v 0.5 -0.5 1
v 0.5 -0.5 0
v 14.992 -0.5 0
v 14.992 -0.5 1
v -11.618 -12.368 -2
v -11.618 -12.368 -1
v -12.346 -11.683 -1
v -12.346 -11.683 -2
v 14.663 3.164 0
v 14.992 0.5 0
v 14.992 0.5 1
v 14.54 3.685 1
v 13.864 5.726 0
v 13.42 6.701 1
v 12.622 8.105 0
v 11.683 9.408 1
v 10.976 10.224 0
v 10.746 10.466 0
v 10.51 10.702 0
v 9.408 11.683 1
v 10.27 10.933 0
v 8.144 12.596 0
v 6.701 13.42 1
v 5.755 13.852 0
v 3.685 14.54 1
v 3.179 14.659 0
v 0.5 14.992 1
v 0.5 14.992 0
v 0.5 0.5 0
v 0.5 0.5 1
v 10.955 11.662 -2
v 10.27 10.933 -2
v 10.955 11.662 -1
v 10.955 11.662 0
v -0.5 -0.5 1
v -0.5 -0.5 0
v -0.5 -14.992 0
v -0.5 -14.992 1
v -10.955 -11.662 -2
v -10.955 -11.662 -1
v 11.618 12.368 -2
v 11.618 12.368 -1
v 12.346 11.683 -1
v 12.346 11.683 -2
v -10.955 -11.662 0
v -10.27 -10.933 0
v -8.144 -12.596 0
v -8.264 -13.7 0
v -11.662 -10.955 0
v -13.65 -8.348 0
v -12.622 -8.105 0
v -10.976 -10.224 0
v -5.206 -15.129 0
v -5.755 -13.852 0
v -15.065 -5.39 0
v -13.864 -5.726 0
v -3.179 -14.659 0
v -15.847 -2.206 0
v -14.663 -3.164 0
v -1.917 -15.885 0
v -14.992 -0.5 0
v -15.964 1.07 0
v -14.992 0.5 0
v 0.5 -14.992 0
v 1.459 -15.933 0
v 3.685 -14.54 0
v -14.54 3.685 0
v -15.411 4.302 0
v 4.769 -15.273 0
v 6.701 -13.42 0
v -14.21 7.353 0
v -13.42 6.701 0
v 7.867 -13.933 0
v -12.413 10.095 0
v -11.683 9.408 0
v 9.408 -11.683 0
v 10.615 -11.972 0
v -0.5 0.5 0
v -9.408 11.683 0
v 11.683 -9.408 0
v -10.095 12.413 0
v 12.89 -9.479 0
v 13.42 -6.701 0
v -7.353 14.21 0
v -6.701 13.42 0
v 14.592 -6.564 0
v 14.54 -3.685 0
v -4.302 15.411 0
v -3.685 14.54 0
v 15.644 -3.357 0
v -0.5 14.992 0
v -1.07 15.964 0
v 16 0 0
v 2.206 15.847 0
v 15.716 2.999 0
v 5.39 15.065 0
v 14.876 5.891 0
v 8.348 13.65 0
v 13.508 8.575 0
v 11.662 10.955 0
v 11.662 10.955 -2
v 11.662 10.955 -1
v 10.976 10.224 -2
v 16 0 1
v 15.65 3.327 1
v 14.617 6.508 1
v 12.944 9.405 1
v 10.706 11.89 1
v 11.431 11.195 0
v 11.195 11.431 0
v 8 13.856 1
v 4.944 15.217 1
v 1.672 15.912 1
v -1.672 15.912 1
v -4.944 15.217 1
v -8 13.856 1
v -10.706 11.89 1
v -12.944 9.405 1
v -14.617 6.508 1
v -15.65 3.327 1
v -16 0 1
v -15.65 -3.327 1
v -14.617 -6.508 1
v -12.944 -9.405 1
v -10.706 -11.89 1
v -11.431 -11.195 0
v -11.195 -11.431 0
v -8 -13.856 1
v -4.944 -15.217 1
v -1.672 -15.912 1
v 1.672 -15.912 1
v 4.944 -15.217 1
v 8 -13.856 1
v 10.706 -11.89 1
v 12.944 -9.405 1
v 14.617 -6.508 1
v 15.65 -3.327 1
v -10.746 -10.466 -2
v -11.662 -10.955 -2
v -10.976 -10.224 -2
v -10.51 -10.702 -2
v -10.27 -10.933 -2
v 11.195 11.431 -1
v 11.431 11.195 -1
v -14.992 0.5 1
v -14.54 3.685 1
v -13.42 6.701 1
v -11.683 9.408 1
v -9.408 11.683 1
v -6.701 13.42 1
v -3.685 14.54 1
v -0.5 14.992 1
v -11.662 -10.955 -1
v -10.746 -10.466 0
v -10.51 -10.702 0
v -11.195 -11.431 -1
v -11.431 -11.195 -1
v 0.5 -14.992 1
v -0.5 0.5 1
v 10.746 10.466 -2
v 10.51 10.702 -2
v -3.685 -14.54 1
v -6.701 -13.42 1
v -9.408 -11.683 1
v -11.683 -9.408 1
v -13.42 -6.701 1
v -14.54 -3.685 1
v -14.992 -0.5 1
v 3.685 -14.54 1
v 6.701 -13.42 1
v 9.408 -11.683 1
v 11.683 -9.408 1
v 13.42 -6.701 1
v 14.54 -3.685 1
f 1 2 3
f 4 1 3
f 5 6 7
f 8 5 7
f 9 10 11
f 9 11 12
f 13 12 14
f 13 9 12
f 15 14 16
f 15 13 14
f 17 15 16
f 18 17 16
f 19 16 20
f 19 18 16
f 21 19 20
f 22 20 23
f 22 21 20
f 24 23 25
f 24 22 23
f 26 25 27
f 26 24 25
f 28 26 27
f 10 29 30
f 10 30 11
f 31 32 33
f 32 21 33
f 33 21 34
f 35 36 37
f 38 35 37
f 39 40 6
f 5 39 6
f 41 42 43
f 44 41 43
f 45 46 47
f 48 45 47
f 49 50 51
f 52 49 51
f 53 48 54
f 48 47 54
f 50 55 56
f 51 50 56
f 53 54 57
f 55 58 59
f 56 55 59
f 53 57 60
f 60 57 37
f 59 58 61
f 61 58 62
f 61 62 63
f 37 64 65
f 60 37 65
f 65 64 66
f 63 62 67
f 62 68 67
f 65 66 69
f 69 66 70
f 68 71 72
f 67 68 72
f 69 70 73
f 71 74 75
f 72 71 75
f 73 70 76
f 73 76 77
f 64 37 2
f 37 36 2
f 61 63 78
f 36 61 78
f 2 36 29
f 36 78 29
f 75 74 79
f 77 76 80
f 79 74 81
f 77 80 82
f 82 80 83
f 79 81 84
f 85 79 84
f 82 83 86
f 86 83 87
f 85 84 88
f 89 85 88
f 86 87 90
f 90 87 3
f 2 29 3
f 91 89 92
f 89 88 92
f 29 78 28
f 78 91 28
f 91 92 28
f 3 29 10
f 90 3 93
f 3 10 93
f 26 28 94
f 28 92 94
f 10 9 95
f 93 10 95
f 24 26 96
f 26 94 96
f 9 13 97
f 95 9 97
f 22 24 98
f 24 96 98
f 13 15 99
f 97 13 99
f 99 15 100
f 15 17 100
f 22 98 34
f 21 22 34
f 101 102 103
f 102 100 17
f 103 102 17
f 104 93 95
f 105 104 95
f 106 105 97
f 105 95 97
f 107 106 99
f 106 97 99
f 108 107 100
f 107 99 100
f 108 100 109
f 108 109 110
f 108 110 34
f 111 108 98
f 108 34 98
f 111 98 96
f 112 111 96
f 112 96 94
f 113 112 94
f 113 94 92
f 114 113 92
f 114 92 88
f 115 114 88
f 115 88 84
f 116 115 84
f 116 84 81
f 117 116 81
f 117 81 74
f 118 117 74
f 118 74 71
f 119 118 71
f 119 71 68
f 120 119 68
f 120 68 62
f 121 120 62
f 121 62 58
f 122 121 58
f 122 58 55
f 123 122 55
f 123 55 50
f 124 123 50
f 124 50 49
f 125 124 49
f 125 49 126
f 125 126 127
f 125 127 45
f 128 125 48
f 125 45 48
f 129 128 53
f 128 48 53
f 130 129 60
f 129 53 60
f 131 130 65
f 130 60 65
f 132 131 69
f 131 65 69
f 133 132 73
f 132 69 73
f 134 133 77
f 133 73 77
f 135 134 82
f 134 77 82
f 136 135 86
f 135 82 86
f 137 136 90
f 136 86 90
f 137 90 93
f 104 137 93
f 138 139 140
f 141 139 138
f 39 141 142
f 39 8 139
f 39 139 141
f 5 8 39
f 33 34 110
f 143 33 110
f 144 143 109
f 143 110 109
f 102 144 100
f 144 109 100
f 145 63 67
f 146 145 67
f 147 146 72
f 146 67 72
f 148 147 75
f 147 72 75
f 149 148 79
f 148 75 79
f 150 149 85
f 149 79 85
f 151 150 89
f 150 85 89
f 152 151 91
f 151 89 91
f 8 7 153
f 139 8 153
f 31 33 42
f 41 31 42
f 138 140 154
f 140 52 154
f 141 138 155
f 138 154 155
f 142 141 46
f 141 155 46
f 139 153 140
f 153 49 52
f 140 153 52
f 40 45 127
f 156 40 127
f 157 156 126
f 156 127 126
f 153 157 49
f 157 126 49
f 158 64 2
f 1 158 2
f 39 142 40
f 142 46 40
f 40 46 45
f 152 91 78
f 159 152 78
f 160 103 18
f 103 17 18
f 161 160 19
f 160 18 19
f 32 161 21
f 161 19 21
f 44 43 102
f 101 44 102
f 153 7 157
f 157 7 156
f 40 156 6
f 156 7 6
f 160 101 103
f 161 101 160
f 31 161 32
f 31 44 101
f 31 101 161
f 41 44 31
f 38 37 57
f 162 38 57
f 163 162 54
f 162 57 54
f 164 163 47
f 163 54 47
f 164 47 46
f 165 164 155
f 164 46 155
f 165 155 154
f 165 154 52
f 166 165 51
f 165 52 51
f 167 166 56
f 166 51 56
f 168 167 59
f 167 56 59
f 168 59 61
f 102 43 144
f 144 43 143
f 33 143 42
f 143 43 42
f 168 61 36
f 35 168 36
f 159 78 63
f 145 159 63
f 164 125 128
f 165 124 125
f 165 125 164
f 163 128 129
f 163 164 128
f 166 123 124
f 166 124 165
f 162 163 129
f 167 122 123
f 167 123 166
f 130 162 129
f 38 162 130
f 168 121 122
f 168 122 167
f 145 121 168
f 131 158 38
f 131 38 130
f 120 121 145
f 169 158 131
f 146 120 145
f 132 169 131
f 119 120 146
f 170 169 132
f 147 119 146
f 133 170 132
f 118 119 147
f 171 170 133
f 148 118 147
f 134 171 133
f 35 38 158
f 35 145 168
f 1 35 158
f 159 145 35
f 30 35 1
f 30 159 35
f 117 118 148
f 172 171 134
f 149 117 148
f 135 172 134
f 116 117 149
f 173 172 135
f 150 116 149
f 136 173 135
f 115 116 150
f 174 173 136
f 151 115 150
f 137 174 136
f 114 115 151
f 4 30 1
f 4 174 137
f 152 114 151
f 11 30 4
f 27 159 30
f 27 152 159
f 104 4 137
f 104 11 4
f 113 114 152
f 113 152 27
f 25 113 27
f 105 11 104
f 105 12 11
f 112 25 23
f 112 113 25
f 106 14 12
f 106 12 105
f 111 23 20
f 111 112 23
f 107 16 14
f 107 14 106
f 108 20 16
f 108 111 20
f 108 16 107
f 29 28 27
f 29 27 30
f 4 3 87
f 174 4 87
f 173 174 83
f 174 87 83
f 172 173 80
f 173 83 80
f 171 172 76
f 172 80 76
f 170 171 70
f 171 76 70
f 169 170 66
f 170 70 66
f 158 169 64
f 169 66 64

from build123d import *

# Parameters (mm, degrees)
SKETCH1_R           = 16
BOSS_EXTRUDE1_DEPTH = 1
BOSS_EXTRUDE2_DEPTH = 1
BOSS_EXTRUDE3_DEPTH = 1
CIRPATTERN1_COUNT   = 2


with BuildPart() as part:
    # Sketch1 → Boss-Extrude1 (new body)
    with BuildSketch(Plane.XY):
        Circle(SKETCH1_R)
        with BuildLine():
            Line((-0.5, 14.991664351), (-0.5, 0.5))
            Line((-0.5, 0.5), (-14.991664351, 0.5))
            ThreePointArc((-14.991664351, 0.5), (-10.606601718, 10.606601718), (-0.5, 14.991664351))
        make_face(mode=Mode.SUBTRACT)
        with BuildLine():
            Line((0.5, 14.991664351), (0.5, 0.5))
            Line((0.5, 0.5), (14.991664351, 0.5))
            ThreePointArc((14.991664351, 0.5), (10.606601718, 10.606601718), (0.5, 14.991664351))
        make_face(mode=Mode.SUBTRACT)
        with BuildLine():
            Line((-14.991664351, -0.5), (-0.5, -0.5))
            Line((-0.5, -0.5), (-0.5, -14.991664351))
            ThreePointArc((-0.5, -14.991664351), (-10.606601718, -10.606601718), (-14.991664351, -0.5))
        make_face(mode=Mode.SUBTRACT)
        with BuildLine():
            Line((0.5, -0.5), (14.991664351, -0.5))
            ThreePointArc((14.991664351, -0.5), (10.606601718, -10.606601718), (0.5, -14.991664351))
            Line((0.5, -14.991664351), (0.5, -0.5))
        make_face(mode=Mode.SUBTRACT)
    extrude(amount=BOSS_EXTRUDE1_DEPTH)

    # Sketch3 → Boss-Extrude2 (add)
    with BuildSketch(Plane(origin=(0, 0, 0), x_dir=(-1, 0, 0), z_dir=(0, 0, -1))):
        with BuildLine():
            Line((-11.661770518, 10.954593027), (-10.97567443, 10.224214923))
            ThreePointArc((-10.97567443, 10.224214923), (-10.628744174, 10.58441294), (-10.269999326, 10.932845642))
            Line((-10.269999326, 10.932845642), (-10.954665948, 11.661702018))
            ThreePointArc((-10.954665948, 11.661702018), (-11.313743872, 11.313673126), (-11.661770518, 10.954593027))
        make_face()
    boss_extrude2 = extrude(amount=BOSS_EXTRUDE2_DEPTH)

    # Sketch4 → Boss-Extrude3 (add)
    with BuildSketch(Plane(origin=(0, 0, -1), x_dir=(-1, 0, 0), z_dir=(0, 0, -1))):
        with BuildLine():
            Line((-11.661770518, 10.954593027), (-10.97567443, 10.224214923))
            ThreePointArc((-10.97567443, 10.224214923), (-10.628744174, 10.58441294), (-10.269999326, 10.932845642))
            Line((-10.269999326, 10.932845642), (-10.954665948, 11.661702018))
            Line((-10.954665948, 11.661702018), (-11.617936738, 12.367781633))
            Line((-11.617936738, 12.367781633), (-12.34643714, 11.683449403))
            Line((-12.34643714, 11.683449403), (-11.661770518, 10.954593027))
        make_face()
    boss_extrude3 = extrude(amount=BOSS_EXTRUDE3_DEPTH)

    # CirPattern1: Boss-Extrude2, Boss-Extrude3 ×2 about axis
    cirpattern1_axis = Axis((0, 0, 0), (0, 0, 1))
    for i in range(1, CIRPATTERN1_COUNT):
        add(boss_extrude2.rotate(cirpattern1_axis, i * 360 / CIRPATTERN1_COUNT))
        add(boss_extrude3.rotate(cirpattern1_axis, i * 360 / CIRPATTERN1_COUNT))


solid = part.part
